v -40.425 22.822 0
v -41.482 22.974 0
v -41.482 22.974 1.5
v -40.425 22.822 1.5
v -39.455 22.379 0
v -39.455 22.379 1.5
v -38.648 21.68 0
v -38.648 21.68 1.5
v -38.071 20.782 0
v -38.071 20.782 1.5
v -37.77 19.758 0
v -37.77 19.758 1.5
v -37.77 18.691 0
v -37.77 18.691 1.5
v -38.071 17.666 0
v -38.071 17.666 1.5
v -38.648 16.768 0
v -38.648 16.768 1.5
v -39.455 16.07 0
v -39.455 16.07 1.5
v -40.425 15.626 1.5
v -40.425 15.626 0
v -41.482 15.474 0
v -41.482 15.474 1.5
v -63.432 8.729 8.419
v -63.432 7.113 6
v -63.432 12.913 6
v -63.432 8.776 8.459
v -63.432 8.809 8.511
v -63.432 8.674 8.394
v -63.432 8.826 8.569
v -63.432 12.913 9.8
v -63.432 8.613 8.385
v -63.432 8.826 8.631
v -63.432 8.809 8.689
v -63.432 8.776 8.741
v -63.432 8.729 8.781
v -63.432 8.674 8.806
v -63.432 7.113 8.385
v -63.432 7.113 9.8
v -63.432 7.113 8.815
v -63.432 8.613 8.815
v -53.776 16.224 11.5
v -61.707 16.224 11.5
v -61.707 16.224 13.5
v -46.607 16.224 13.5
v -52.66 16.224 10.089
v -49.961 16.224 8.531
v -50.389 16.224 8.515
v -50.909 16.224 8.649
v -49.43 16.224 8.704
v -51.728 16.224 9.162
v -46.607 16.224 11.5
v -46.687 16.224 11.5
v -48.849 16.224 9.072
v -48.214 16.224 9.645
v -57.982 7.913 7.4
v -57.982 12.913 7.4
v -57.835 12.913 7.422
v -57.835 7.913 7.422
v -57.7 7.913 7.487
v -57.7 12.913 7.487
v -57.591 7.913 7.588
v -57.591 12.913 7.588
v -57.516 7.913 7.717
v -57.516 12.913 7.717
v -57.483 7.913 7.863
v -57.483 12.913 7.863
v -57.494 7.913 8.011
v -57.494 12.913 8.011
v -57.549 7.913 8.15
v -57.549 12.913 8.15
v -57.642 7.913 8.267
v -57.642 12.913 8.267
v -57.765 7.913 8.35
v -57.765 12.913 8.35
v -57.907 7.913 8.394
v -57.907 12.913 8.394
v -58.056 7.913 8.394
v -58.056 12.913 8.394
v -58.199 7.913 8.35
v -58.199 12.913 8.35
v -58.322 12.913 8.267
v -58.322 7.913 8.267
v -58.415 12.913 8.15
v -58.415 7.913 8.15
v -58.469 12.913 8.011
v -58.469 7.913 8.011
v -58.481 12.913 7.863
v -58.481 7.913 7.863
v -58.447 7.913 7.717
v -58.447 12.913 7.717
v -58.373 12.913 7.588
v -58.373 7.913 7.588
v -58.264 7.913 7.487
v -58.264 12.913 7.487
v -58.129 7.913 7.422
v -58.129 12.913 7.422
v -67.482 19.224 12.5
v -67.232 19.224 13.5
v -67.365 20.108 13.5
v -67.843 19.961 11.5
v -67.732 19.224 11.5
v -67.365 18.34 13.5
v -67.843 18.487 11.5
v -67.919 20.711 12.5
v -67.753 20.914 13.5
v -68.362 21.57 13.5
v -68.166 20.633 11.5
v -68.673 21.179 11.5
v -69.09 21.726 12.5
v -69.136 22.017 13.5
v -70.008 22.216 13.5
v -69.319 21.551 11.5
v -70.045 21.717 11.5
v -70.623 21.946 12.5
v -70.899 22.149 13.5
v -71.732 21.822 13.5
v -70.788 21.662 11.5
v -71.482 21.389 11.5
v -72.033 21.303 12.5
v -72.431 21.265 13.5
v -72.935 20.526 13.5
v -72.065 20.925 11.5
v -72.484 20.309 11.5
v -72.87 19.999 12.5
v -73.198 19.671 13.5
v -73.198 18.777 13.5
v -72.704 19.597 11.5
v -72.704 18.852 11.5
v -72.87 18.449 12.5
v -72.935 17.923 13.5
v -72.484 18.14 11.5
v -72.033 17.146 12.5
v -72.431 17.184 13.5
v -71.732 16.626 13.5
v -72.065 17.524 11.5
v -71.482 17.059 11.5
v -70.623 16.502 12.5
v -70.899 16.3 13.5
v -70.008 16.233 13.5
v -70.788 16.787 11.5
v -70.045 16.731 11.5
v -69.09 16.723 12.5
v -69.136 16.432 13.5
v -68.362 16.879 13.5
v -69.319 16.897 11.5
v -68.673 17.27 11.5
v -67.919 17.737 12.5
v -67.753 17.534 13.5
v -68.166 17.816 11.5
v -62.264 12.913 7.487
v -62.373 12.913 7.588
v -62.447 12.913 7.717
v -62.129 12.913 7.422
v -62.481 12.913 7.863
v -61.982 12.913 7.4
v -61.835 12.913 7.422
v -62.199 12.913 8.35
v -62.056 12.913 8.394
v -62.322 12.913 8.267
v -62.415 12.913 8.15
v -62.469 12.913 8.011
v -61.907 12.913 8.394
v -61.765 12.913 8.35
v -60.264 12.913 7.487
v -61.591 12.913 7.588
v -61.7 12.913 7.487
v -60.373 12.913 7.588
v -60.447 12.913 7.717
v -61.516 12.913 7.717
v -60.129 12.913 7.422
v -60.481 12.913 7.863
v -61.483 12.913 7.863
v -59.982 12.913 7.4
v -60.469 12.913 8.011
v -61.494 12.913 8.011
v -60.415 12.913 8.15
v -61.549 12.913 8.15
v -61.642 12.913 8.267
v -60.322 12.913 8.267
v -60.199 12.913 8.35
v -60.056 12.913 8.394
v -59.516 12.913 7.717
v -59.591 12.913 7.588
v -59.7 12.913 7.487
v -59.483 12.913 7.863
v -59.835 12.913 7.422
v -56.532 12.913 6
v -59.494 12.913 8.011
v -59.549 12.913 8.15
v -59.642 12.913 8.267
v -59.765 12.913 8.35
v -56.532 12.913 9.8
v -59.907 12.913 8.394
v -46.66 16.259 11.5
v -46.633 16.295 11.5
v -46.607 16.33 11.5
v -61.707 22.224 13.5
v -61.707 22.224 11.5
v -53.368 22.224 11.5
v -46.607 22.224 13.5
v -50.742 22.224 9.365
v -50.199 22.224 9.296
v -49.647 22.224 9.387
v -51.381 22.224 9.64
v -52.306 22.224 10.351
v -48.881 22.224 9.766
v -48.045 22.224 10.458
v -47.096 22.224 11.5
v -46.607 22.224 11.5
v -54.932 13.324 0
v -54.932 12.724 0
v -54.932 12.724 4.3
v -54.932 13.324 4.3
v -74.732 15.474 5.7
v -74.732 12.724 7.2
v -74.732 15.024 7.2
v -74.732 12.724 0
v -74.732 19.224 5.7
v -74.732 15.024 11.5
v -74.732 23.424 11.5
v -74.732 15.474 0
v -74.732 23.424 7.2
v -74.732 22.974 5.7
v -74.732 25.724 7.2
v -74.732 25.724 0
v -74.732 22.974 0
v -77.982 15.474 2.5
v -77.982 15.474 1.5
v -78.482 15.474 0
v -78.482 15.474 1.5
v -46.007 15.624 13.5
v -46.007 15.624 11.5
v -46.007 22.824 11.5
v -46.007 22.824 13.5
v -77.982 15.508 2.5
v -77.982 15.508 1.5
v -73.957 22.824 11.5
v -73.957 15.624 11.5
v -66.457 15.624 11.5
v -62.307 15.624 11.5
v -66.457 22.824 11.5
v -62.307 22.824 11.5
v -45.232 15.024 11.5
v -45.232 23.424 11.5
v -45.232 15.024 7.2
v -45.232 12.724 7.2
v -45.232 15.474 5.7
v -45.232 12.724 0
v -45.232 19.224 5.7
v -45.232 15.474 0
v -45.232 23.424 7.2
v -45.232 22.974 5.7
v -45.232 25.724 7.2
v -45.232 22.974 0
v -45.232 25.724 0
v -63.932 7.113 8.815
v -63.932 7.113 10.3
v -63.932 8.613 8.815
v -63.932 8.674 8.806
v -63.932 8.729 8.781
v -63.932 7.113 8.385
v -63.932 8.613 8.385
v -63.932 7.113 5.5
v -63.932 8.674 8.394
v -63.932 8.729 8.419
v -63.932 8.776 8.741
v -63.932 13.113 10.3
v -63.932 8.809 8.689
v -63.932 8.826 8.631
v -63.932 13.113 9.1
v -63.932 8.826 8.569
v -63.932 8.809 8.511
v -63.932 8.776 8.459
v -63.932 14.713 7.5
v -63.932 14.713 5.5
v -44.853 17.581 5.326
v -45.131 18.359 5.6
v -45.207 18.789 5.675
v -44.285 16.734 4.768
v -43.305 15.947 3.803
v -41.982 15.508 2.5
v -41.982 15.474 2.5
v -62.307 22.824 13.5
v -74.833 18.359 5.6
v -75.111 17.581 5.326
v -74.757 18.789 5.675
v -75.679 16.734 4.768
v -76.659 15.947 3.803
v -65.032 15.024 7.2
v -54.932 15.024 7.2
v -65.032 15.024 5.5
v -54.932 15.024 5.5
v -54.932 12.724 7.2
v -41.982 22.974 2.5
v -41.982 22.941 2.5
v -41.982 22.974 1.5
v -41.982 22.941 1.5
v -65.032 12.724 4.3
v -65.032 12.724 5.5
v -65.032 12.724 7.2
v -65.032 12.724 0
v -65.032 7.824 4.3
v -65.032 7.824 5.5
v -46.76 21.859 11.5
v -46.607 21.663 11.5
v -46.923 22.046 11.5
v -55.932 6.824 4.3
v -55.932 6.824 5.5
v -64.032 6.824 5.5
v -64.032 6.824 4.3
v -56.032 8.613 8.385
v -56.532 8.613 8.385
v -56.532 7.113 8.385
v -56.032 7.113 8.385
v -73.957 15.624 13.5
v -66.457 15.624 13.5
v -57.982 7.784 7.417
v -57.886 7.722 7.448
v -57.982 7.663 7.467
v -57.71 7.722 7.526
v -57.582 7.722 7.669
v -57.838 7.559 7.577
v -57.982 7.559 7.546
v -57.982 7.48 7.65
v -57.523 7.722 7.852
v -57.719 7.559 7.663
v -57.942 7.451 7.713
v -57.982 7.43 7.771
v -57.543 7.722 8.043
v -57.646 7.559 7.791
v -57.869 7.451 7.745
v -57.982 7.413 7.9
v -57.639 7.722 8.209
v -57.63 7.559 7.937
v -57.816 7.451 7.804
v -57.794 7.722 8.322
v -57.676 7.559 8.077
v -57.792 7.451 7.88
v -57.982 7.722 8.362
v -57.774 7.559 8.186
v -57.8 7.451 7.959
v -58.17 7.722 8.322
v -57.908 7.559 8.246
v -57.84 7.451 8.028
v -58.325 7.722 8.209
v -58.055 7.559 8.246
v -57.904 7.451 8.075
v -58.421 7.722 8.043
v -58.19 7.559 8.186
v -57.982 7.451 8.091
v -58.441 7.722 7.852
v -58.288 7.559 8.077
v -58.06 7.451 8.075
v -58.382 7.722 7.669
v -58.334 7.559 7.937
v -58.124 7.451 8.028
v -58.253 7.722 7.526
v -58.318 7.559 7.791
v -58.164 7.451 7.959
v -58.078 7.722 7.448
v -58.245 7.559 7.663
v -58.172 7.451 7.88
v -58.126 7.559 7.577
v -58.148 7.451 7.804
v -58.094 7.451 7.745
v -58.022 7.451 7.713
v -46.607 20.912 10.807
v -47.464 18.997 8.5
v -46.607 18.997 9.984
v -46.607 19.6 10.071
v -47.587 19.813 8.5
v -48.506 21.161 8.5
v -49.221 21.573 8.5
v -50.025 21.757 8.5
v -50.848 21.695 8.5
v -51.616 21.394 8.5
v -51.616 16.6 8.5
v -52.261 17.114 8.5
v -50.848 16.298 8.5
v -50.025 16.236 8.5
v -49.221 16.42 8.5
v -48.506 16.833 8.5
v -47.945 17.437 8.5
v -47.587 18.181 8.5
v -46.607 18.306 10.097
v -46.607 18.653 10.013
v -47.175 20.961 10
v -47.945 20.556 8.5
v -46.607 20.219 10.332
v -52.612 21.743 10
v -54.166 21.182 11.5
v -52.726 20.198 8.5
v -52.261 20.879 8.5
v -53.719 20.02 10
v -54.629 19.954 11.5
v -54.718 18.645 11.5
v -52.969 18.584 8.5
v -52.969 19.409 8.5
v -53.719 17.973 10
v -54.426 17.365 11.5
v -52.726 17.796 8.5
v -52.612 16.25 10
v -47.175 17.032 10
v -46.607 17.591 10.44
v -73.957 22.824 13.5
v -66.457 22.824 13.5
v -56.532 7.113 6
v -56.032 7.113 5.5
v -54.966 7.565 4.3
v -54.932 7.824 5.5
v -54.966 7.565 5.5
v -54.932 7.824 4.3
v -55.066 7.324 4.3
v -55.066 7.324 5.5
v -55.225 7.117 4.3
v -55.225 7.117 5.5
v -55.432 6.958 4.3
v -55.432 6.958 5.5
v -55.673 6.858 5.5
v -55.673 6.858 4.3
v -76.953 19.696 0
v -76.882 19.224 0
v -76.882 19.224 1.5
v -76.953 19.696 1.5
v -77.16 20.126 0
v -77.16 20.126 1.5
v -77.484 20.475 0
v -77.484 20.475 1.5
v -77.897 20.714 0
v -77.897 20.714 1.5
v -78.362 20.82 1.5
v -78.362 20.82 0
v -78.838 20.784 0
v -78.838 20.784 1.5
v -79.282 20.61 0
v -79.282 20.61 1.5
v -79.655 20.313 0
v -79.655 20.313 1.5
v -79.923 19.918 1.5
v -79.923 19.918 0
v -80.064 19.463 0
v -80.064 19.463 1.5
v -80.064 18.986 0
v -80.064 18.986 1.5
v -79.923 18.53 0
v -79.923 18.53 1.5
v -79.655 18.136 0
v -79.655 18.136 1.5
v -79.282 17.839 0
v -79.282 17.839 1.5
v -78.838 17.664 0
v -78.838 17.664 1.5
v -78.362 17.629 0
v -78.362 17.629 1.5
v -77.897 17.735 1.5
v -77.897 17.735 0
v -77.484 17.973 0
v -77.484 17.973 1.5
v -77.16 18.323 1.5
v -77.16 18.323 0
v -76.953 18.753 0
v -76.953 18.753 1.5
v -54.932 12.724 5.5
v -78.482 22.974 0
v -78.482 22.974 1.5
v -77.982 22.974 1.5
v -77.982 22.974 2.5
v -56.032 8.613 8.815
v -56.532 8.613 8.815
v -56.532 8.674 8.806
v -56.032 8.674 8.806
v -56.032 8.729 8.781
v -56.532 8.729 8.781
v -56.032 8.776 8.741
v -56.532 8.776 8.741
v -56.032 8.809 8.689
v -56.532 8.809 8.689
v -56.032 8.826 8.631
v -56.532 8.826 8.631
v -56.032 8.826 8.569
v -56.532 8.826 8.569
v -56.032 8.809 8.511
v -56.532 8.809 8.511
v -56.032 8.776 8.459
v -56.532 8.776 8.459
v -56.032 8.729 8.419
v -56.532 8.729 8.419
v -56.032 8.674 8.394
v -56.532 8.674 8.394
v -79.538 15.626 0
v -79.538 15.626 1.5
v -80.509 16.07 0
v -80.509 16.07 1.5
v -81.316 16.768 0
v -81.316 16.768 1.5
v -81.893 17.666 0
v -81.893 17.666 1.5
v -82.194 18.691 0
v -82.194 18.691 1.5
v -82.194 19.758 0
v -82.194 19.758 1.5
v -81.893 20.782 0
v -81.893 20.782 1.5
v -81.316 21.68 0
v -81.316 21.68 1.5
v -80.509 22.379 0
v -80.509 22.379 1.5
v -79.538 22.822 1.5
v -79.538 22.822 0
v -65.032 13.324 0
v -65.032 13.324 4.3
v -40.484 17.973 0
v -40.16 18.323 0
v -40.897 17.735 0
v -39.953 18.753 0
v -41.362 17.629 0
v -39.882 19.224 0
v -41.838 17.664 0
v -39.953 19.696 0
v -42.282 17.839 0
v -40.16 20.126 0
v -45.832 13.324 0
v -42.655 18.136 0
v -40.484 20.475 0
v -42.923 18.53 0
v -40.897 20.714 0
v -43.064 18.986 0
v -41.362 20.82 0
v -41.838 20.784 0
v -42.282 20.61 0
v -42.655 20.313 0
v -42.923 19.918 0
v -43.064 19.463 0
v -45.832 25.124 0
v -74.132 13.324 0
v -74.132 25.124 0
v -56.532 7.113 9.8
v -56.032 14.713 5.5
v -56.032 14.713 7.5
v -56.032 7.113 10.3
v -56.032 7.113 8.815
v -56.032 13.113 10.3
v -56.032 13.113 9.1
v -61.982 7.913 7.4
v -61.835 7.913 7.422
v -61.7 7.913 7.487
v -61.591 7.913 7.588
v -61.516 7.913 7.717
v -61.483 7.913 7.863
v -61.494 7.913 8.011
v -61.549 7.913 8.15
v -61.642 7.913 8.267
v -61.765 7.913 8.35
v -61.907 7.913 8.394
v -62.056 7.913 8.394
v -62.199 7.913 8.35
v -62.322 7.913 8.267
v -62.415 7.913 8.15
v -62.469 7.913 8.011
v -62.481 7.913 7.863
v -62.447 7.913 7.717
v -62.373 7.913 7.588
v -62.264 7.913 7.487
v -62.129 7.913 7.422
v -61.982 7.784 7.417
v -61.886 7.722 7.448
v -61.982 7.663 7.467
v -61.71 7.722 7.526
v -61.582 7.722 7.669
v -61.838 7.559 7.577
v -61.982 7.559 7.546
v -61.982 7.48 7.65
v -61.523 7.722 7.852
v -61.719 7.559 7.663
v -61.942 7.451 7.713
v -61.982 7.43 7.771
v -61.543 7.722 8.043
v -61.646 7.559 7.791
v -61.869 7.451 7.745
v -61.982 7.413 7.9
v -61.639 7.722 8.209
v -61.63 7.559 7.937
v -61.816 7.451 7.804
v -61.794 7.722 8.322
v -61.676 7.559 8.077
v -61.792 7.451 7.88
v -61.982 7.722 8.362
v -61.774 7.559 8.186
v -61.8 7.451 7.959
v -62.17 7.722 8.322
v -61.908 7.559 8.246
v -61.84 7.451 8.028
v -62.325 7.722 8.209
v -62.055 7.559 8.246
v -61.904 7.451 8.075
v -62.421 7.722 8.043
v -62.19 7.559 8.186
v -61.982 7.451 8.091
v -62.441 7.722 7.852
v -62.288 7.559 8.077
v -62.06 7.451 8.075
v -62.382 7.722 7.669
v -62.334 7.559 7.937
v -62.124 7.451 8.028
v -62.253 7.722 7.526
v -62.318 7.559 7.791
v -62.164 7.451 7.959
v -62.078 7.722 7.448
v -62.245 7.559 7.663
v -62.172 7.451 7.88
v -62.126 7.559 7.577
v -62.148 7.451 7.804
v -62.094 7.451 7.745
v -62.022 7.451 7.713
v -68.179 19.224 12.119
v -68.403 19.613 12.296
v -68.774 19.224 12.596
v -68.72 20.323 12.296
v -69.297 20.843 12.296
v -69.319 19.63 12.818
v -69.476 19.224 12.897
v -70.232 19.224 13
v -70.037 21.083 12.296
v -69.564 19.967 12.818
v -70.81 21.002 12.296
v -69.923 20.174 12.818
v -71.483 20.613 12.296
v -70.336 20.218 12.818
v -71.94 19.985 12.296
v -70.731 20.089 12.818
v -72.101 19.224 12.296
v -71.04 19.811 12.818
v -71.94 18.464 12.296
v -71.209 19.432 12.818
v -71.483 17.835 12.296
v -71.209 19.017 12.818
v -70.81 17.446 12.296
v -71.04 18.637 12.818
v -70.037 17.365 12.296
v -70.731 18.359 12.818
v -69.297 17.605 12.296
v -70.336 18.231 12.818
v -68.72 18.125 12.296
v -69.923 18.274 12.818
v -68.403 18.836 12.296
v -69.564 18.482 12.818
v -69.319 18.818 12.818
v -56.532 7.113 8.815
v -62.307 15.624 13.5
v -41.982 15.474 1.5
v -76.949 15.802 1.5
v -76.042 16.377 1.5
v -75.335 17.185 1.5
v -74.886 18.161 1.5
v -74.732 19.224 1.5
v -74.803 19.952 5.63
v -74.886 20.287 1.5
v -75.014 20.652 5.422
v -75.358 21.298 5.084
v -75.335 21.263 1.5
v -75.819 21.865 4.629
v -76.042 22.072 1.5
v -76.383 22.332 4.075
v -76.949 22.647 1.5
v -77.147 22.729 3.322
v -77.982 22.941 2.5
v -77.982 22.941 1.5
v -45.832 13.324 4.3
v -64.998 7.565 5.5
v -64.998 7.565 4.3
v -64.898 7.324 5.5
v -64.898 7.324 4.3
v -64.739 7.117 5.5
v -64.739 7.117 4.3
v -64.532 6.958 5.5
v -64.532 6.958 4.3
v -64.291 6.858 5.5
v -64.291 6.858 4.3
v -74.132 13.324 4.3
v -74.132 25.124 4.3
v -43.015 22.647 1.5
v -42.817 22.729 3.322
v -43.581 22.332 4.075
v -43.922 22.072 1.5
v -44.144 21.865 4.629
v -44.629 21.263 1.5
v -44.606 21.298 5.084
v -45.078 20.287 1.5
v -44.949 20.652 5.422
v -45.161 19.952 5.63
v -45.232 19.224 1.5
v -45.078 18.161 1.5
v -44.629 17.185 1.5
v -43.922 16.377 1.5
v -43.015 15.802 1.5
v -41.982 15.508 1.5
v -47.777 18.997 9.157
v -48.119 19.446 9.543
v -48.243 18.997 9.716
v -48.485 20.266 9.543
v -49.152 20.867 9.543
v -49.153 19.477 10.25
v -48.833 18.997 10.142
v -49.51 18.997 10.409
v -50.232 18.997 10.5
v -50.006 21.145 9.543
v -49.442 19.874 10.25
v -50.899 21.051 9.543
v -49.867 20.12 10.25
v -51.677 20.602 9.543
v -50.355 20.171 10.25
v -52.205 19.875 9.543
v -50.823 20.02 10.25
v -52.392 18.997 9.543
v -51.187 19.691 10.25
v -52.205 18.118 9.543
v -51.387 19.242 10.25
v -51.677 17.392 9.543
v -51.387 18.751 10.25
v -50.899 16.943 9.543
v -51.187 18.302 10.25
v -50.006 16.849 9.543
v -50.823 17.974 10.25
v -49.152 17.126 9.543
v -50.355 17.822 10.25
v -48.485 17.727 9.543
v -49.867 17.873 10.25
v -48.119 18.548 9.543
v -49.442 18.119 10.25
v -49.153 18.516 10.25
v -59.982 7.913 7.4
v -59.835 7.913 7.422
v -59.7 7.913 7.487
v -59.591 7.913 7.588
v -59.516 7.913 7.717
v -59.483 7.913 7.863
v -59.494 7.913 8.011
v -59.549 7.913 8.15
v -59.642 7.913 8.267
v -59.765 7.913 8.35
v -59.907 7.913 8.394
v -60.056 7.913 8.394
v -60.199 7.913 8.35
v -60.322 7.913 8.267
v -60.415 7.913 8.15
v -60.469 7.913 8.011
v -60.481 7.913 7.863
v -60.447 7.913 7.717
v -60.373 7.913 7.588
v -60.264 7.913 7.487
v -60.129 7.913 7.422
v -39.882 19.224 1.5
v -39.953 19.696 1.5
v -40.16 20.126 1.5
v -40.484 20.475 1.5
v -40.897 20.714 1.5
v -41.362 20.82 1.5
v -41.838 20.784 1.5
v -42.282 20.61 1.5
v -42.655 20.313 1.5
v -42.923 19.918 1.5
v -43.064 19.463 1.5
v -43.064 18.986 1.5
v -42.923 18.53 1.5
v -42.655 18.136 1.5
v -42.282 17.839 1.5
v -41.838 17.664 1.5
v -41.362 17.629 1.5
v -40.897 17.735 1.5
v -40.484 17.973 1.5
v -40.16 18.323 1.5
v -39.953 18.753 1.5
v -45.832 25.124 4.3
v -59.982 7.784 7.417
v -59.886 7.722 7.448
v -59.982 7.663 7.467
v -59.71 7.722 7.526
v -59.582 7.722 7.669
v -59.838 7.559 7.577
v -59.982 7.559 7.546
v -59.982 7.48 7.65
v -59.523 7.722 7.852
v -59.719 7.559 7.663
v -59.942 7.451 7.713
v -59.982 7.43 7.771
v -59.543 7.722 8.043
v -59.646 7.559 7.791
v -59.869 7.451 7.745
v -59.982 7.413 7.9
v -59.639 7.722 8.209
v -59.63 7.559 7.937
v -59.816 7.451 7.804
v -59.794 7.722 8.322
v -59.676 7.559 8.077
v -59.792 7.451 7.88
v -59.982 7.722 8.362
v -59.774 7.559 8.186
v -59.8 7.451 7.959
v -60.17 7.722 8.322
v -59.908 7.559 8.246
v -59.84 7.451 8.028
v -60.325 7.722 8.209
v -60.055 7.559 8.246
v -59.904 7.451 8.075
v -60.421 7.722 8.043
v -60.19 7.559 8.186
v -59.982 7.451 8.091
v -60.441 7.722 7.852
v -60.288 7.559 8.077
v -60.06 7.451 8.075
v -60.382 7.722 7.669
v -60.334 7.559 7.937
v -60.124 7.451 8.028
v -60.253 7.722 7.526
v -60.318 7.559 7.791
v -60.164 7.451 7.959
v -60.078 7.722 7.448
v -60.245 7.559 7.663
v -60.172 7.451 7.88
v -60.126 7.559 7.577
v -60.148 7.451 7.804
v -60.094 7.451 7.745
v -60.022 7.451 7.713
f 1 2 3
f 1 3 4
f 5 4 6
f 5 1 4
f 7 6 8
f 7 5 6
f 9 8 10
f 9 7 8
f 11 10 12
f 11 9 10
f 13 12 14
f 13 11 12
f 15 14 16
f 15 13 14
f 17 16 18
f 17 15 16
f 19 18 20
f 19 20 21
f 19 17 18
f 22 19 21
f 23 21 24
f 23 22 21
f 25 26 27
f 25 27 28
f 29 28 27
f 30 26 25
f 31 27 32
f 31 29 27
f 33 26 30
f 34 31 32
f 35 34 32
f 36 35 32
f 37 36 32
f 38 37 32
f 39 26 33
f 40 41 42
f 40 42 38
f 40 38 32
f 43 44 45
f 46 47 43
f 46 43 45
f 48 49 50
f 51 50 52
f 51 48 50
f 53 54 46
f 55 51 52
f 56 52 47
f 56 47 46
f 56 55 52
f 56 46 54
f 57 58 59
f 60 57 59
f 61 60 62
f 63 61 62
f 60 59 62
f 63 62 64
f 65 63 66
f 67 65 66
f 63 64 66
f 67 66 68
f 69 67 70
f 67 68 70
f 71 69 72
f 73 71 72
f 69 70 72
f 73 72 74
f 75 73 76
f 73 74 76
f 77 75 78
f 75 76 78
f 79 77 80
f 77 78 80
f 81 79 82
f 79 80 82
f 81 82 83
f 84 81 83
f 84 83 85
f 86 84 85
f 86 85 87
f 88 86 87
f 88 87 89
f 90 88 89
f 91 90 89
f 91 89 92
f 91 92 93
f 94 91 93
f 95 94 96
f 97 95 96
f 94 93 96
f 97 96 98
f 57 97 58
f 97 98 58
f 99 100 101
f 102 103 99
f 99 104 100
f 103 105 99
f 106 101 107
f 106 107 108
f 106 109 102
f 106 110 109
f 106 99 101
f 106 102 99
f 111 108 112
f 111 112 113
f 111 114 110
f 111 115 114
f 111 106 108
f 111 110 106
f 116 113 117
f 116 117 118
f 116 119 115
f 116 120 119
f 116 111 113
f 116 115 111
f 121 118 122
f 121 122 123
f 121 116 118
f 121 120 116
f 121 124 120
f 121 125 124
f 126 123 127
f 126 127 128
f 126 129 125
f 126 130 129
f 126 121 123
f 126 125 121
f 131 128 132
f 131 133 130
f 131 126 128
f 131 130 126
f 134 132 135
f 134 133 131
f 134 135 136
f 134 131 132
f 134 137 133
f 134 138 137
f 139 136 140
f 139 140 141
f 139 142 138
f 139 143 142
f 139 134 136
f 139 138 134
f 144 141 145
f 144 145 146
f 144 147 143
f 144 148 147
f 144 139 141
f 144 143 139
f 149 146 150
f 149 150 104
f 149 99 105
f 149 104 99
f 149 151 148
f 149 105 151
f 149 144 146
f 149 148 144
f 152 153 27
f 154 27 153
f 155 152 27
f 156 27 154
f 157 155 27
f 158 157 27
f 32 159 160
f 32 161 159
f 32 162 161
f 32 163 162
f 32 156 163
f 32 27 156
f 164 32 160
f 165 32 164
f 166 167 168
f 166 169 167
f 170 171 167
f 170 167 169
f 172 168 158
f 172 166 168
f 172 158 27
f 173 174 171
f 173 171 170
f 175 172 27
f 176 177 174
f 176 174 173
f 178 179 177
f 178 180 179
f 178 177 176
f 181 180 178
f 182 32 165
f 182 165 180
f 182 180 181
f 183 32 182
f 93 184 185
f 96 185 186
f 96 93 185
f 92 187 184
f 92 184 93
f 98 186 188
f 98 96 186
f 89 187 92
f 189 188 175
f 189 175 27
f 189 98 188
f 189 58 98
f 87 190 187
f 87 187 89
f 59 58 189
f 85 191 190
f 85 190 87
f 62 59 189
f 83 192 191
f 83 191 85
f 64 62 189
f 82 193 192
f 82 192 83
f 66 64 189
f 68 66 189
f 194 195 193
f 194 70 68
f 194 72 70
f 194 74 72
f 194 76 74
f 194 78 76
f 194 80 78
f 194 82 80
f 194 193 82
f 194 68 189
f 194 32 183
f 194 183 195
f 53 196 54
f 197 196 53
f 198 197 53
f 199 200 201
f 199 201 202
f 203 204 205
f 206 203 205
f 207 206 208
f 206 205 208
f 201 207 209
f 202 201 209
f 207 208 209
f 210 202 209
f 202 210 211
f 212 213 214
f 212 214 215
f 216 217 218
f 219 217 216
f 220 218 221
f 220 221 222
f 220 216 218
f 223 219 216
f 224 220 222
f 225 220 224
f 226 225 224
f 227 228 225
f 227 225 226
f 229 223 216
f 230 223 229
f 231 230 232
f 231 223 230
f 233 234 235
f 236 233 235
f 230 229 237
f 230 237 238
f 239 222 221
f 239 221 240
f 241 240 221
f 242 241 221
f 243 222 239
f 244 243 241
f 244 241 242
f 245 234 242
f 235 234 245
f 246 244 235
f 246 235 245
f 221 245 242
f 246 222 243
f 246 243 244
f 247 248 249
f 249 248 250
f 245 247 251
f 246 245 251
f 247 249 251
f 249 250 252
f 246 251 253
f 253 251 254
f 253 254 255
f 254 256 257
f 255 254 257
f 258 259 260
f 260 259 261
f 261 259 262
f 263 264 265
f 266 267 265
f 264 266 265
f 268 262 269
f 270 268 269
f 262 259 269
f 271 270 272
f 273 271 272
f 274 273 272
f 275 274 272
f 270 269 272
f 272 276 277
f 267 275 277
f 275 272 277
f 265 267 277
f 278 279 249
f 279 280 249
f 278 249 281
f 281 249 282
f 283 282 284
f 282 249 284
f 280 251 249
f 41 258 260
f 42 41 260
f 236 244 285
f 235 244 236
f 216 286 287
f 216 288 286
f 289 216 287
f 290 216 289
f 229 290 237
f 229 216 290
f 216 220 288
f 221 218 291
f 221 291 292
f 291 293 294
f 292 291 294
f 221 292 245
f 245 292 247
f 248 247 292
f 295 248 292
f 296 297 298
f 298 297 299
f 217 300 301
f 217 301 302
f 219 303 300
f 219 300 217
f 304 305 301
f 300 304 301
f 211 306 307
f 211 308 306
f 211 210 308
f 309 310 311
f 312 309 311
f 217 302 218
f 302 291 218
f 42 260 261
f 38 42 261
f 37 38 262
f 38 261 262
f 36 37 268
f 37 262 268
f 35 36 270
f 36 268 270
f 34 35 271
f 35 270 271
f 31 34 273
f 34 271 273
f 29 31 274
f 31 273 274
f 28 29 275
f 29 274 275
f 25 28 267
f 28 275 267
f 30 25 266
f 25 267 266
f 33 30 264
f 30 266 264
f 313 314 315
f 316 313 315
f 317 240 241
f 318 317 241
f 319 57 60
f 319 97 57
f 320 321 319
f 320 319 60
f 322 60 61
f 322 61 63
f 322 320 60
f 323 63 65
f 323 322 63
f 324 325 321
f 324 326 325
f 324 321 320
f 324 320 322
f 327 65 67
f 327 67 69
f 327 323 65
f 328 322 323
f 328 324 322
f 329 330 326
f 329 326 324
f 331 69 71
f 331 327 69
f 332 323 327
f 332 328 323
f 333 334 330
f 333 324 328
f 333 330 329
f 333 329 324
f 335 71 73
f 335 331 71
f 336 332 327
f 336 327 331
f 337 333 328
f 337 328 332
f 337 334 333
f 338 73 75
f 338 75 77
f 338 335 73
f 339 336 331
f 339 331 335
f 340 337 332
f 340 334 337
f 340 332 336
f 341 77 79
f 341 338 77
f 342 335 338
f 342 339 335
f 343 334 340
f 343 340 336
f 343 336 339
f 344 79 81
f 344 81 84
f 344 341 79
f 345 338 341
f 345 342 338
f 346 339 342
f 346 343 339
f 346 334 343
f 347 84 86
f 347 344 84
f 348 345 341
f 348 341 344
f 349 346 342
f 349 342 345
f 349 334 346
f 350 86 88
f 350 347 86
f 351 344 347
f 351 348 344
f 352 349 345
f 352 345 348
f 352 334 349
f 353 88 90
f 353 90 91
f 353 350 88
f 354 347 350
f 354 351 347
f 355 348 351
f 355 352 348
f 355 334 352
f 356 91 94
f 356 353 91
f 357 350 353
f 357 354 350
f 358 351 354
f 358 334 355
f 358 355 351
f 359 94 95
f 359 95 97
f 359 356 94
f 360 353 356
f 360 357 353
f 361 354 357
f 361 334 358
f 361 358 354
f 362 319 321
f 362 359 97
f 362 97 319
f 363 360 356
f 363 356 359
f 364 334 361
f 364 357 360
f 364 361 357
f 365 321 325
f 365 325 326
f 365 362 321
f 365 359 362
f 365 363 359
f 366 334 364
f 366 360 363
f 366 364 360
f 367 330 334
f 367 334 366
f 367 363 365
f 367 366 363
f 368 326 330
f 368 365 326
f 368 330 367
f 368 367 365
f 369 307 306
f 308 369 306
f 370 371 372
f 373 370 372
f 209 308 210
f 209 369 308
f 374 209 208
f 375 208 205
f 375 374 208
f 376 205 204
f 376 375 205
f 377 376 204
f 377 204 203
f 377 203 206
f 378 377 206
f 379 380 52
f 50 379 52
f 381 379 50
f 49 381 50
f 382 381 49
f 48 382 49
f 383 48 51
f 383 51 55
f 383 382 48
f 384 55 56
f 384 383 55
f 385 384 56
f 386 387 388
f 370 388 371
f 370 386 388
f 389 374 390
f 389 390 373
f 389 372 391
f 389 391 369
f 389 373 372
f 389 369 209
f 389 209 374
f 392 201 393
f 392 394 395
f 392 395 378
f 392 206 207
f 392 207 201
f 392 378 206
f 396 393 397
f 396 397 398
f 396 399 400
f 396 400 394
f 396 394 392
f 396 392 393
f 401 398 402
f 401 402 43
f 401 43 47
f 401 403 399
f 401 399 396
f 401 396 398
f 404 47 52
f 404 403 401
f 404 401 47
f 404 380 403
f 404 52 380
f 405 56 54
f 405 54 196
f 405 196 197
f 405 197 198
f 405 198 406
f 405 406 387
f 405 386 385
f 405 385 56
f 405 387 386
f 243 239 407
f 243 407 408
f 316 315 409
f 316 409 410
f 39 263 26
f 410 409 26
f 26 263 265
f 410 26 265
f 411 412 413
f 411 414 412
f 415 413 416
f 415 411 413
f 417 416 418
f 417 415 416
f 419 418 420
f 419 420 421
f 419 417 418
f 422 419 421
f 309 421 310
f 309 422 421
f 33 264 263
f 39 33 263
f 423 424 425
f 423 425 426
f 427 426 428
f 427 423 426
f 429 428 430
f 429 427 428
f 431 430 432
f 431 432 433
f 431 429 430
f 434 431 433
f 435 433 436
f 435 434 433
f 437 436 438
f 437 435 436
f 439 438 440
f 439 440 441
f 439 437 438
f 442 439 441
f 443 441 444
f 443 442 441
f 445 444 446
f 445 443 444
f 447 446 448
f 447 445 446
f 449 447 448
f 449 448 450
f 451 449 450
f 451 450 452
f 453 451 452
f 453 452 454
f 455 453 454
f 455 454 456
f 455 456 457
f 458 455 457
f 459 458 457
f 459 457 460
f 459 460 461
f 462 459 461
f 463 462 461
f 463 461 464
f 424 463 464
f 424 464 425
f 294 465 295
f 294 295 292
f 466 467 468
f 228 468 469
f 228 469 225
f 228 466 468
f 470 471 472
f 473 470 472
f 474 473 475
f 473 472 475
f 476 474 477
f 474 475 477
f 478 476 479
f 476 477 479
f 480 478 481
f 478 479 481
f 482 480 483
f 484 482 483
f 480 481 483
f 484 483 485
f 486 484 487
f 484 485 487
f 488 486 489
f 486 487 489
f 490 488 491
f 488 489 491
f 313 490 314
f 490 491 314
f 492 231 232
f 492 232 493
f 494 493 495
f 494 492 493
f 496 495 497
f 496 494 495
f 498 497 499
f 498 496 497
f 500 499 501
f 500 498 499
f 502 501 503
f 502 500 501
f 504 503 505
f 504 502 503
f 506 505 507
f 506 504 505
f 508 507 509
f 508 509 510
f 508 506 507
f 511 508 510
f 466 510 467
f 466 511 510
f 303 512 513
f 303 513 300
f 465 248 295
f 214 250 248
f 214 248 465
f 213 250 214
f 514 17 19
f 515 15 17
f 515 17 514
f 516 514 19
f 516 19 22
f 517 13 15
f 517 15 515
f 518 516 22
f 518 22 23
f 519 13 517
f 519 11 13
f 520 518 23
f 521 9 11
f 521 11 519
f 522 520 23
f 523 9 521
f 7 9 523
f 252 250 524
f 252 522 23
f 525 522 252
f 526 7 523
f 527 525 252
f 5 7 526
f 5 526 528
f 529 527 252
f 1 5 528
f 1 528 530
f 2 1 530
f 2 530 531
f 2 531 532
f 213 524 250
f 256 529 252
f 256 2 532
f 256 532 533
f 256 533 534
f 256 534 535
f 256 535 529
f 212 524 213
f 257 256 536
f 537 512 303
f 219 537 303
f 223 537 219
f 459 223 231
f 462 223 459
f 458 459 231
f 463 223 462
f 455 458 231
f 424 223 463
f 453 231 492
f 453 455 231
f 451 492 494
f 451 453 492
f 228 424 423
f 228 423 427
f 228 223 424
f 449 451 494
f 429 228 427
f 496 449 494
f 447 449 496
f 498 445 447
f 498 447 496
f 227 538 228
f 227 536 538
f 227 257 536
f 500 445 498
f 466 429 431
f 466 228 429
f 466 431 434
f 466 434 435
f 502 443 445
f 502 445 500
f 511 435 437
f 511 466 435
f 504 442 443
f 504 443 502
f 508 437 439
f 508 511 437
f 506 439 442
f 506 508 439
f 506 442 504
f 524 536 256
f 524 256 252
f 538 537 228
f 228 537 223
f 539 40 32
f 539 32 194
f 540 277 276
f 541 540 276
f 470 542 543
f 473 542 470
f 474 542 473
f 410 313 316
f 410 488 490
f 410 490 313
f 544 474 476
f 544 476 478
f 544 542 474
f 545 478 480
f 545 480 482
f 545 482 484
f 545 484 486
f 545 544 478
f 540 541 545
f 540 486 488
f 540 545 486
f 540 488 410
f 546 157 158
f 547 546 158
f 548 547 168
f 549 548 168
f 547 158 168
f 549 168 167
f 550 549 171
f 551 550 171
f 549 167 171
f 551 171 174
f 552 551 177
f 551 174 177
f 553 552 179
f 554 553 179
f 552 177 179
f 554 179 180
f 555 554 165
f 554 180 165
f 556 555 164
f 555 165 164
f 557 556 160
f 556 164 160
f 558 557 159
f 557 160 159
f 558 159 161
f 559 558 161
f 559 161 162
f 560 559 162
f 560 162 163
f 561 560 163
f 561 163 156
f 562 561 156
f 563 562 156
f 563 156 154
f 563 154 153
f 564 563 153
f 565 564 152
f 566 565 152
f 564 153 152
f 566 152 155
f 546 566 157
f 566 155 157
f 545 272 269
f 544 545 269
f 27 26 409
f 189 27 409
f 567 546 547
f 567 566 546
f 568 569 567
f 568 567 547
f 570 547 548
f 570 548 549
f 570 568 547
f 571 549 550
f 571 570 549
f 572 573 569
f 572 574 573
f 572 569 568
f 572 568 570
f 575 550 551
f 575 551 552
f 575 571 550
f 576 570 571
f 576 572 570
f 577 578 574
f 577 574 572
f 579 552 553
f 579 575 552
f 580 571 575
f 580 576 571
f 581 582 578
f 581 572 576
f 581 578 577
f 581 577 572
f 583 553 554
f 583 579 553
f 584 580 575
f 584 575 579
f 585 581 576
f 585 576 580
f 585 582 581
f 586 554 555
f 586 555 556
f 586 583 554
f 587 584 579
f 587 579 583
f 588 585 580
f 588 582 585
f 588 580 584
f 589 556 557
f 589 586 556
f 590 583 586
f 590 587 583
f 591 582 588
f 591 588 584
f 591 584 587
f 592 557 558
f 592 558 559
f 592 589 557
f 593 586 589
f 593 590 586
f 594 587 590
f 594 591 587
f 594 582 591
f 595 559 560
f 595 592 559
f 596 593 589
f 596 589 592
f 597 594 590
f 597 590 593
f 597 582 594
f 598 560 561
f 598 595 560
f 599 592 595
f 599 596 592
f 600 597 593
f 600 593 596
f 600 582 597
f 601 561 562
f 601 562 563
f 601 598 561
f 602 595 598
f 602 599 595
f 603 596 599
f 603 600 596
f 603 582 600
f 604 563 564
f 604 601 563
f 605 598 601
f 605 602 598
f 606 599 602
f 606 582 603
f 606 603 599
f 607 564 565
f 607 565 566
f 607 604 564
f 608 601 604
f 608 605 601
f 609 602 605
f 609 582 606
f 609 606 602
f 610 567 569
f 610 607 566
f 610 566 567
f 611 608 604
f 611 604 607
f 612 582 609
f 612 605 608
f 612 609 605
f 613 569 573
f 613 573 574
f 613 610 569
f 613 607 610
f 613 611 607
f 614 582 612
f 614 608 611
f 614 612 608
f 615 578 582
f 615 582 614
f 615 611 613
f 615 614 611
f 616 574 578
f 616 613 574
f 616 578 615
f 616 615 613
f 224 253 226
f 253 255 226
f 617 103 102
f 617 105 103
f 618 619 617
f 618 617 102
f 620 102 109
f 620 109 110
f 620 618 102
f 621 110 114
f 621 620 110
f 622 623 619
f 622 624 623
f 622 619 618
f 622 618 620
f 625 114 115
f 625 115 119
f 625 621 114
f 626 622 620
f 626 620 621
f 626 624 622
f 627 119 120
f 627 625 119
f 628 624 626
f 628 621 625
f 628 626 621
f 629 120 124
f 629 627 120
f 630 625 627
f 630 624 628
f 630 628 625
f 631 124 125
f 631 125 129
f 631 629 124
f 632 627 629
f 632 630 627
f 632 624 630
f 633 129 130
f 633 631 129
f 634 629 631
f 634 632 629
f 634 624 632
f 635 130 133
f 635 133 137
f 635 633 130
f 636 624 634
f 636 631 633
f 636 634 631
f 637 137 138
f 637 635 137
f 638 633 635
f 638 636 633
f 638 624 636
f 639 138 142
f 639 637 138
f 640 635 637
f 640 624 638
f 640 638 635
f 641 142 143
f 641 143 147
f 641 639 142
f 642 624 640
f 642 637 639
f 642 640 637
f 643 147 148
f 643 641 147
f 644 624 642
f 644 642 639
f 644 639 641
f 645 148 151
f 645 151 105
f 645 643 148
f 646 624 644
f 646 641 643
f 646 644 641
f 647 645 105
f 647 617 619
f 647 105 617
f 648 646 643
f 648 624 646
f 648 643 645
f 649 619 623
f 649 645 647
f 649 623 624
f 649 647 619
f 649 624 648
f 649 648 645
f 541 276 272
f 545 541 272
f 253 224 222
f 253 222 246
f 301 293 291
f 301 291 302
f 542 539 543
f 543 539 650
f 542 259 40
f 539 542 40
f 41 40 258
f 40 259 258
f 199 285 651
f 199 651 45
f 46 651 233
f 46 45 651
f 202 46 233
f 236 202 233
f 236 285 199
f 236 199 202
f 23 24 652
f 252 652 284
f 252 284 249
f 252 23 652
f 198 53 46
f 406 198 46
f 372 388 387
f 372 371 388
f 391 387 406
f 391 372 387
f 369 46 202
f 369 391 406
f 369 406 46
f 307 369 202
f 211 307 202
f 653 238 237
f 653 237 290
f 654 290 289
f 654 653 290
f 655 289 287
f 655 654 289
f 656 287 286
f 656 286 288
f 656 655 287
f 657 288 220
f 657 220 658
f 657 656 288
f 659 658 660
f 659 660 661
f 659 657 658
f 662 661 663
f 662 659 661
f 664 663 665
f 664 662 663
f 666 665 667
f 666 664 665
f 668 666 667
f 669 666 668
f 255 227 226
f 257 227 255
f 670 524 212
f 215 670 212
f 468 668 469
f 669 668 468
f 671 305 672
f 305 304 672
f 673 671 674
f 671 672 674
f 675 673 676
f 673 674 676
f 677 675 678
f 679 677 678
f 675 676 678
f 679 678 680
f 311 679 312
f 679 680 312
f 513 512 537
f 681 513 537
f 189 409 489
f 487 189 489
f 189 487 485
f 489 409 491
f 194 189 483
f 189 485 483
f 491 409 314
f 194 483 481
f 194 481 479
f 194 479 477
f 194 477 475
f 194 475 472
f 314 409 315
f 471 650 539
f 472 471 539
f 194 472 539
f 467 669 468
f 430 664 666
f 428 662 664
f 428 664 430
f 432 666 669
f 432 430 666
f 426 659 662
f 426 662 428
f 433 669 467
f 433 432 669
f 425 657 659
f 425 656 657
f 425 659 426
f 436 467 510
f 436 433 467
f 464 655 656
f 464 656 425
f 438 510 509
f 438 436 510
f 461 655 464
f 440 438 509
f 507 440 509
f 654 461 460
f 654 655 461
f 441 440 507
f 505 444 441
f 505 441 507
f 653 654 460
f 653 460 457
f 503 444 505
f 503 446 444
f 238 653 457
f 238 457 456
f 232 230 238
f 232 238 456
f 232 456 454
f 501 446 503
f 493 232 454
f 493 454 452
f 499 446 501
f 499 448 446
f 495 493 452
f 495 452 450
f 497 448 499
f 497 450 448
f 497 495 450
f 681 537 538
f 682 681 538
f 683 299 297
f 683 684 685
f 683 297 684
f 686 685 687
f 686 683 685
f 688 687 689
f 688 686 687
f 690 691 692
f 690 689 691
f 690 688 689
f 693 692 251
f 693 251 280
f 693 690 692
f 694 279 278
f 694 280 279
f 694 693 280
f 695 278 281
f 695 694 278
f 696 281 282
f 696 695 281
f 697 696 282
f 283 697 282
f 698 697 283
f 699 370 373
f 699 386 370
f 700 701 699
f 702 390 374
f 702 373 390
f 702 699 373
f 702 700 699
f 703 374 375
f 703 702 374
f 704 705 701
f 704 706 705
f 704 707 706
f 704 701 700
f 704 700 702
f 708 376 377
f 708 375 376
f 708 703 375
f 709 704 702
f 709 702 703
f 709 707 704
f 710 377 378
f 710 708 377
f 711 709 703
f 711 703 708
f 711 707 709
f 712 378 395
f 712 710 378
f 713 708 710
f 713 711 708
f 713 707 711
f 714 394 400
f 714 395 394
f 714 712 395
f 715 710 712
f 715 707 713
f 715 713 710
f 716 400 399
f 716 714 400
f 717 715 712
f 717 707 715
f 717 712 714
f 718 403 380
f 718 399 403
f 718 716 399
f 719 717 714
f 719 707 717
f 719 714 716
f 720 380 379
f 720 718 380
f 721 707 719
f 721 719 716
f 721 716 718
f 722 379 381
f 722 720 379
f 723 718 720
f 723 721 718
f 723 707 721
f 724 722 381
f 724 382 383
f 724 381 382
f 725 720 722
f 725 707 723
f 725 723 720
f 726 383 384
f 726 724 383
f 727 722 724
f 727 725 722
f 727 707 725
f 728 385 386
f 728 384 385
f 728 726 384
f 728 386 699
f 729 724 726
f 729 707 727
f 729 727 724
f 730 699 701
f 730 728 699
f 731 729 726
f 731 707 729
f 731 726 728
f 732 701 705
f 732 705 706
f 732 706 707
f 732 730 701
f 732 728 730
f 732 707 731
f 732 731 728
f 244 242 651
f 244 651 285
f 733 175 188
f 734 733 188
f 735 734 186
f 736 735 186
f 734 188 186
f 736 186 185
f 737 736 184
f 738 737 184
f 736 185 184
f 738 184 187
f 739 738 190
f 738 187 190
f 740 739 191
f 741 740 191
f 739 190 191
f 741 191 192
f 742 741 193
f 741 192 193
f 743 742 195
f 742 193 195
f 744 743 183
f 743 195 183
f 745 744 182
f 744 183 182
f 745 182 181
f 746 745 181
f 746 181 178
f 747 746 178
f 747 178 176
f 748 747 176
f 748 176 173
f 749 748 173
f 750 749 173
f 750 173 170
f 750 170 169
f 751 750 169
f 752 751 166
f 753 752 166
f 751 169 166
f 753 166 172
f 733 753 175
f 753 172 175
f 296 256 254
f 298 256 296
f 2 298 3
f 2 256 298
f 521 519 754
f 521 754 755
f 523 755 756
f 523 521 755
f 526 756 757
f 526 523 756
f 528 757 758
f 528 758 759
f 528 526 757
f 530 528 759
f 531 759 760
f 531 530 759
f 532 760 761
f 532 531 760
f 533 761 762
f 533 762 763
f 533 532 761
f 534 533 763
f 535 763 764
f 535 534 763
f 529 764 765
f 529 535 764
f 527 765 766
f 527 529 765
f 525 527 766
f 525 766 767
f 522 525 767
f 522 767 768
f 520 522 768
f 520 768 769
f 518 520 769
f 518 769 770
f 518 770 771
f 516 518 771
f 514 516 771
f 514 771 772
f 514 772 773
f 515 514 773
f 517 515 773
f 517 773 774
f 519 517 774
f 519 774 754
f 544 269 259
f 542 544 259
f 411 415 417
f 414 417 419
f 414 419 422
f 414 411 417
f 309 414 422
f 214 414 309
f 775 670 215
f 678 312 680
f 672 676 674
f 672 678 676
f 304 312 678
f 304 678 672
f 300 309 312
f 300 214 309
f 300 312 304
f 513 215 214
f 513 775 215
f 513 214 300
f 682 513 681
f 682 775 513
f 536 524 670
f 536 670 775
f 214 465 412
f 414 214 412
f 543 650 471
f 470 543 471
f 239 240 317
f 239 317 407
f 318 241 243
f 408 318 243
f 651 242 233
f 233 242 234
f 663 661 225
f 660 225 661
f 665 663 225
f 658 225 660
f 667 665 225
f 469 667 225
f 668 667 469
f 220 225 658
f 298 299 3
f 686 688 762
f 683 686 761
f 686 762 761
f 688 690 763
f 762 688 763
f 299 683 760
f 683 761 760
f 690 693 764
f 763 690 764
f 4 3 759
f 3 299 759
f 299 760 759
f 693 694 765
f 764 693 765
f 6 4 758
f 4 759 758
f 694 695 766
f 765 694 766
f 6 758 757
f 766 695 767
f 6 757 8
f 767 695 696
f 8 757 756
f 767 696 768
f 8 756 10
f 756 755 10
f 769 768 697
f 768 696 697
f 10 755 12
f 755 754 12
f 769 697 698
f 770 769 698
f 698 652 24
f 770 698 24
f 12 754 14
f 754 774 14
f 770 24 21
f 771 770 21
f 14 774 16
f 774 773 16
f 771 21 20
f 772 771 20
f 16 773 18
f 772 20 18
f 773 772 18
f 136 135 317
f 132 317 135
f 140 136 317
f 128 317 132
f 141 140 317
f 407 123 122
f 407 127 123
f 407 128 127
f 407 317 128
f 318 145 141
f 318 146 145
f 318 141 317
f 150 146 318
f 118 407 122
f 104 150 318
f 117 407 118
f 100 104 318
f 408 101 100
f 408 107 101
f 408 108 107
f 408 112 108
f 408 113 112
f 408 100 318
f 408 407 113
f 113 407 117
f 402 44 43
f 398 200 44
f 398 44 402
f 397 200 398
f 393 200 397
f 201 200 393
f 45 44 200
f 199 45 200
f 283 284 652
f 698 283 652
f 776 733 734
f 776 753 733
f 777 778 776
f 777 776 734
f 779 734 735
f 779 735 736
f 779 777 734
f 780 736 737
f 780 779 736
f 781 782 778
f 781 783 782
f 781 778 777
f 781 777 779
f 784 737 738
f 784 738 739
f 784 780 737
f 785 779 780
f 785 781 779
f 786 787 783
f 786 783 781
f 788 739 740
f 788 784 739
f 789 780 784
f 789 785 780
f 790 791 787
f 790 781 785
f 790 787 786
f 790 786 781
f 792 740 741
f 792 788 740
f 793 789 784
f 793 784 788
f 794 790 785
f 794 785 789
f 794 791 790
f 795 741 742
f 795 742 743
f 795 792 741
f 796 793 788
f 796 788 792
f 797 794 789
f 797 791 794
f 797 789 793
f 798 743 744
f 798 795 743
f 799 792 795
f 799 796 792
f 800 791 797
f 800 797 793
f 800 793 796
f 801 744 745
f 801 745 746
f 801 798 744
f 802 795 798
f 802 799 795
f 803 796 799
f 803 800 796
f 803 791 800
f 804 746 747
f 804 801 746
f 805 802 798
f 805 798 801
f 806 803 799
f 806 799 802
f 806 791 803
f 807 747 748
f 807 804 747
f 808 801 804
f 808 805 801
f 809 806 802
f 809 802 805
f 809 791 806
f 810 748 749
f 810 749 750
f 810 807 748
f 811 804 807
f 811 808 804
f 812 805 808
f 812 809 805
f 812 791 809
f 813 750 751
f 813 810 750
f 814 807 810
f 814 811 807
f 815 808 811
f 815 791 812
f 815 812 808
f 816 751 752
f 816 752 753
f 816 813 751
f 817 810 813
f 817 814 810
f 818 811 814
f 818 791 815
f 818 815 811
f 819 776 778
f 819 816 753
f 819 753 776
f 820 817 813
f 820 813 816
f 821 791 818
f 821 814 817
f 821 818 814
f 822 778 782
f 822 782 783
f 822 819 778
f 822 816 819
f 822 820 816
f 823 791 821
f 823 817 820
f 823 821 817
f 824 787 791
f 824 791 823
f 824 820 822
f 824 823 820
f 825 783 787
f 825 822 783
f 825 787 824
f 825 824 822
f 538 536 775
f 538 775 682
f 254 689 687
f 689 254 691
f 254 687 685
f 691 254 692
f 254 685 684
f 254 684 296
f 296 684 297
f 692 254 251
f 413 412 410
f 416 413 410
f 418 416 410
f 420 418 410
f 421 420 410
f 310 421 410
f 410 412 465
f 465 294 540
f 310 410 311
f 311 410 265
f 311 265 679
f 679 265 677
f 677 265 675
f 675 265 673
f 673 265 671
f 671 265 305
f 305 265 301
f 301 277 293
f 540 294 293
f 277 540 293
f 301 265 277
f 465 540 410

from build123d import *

# Parameters (mm, degrees)
SKETCH2_R                = 1.6
BOSS_EXTRUDE1_DEPTH      = 7.2
CUT_EXTRUDE1_DEPTH       = 84.563926387
SKETCH5_R                = 3.75
CUT_EXTRUDE2_DEPTH       = 87.349960246
SKETCH6_W                = 29.5
SKETCH6_H                = 8.4
BOSS_EXTRUDE2_DEPTH      = 4.3
SKETCH7_W                = 7.5
SKETCH7_H                = 7.2
SKETCH7_R                = 2.5
SKETCH7_W_2              = 16.3
SKETCH7_W_3              = 15.1
SKETCH7_H_2              = 6
BOSS_EXTRUDE3_DEPTH      = 2
CHAMFER1_SIZE2           = 2
CHAMFER1_SIZE            = 0.5
SKETCH8_R                = 2.5
CUT_EXTRUDE3_DEPTH       = 3
CHAMFER2_SIZE            = 2
CHAMFER2_SIZE_2          = 3.464101615
SKETCH9_W                = 28.3
SKETCH9_H                = 11.8
CUT_EXTRUDE4_DEPTH       = 5.5
BOSS_EXTRUDE4_DEPTH      = 1.2
FILLET1_R                = 1
BOSS_EXTRUDE5_DEPTH      = 3.95
BOSS_EXTRUDE5_DEPTH_BACK = 3.95
SKETCH17_W               = 6.9
SKETCH17_H               = 3.8
CUT_EXTRUDE5_DEPTH       = 5.8
SKETCH18_R               = 0.5
BOSS_EXTRUDE6_DEPTH      = 5.5
FILLET2_R                = 0.5


# Some blends are built 0.0001 mm under size
with BuildPart() as part:
    # Sketch2 → Boss-Extrude1 (new body)
    with BuildSketch(Plane.XY):
        with BuildLine():
            Line((-74.731926848, 25.724226739), (-45.231926848, 25.724226739))
            Line((-45.231926848, 25.724226739), (-45.231926848, 22.974226739))
            Line((-45.231926848, 22.974226739), (-41.481926848, 22.974226739))
            ThreePointArc((-41.481926848, 22.974226739), (-37.731926848, 19.224226739), (-41.481926848, 15.474226739))
            Line((-41.481926848, 15.474226739), (-45.231926848, 15.474226739))
            Line((-45.231926848, 15.474226739), (-45.231926848, 12.724226739))
            Line((-45.231926848, 12.724226739), (-54.931926848, 12.724226739))
            Line((-54.931926848, 12.724226739), (-54.931926848, 15.024226739))
            Line((-54.931926848, 15.024226739), (-65.031926848, 15.024226739))
            Line((-65.031926848, 15.024226739), (-65.031926848, 12.724226739))
            Line((-65.031926848, 12.724226739), (-74.731926848, 12.724226739))
            Line((-74.731926848, 12.724226739), (-74.731926848, 15.474226739))
            Line((-74.731926848, 15.474226739), (-78.481926848, 15.474226739))
            ThreePointArc((-78.481926848, 15.474226739), (-82.231926848, 19.224226739), (-78.481926848, 22.974226739))
            Line((-78.481926848, 22.974226739), (-74.731926848, 22.974226739))
            Line((-74.731926848, 22.974226739), (-74.731926848, 25.724226739))
        make_face()
        with Locations((-78.481926848, 19.224226739)):
            Circle(SKETCH2_R, mode=Mode.SUBTRACT)
        with Locations((-41.481926848, 19.224226739)):
            Circle(SKETCH2_R, mode=Mode.SUBTRACT)
    extrude(amount=BOSS_EXTRUDE1_DEPTH)

    # Sketch4 → Cut-Extrude1 (cut, through all)
    with BuildSketch(Plane.XZ.offset(-12.724226739)):
        Polygon((-74.731926848, 5.7), (-77.981926848, 2.5), (-77.981926848, 1.5), (-84.83036896, 1.5), (-84.83036896, 9.527639916), (-74.731926848, 9.527639916), align=None)
        Polygon((-45.231926848, 9.527639916), (-45.231926848, 5.7), (-41.981926848, 2.5), (-41.981926848, 1.5), (-35.133484736, 1.5), (-35.133484736, 9.527639916), align=None)
    extrude(amount=-CUT_EXTRUDE1_DEPTH, mode=Mode.SUBTRACT)

    # Sketch5 → Cut-Extrude2 (cut, through all)
    with BuildSketch(Plane.XY.offset(1.5)):
        with Locations((-78.481926848, 19.224226739)):
            Circle(SKETCH5_R)
        with Locations((-41.481926848, 19.224226739)):
            Circle(SKETCH5_R)
    extrude(amount=CUT_EXTRUDE2_DEPTH, mode=Mode.SUBTRACT)

    # Sketch6 → Boss-Extrude2 (add)
    with BuildSketch(Plane.XY.offset(7.2)):
        with Locations((-59.981926848, 19.224226739)):
            Rectangle(SKETCH6_W, SKETCH6_H)
    extrude(amount=BOSS_EXTRUDE2_DEPTH)

    # Sketch7 → Boss-Extrude3 (add)
    # profile 1 of 2: a face of its own
    with BuildSketch(Plane.XY.offset(11.5)):
        with Locations((-70.206926848, 19.224226739)):
            Rectangle(SKETCH7_W, SKETCH7_H)
        with Locations((-70.231926848, 19.224226739)):
            Circle(SKETCH7_R, mode=Mode.SUBTRACT)
    # profile 2 of 2: a face of its own
    with BuildSketch(Plane.XY.offset(11.5)):
        with Locations((-54.156926848, 19.224226739)):
            Rectangle(SKETCH7_W_2, SKETCH7_H)
        with Locations((-54.156926848, 19.224226739)):
            Rectangle(SKETCH7_W_3, SKETCH7_H_2, mode=Mode.SUBTRACT)
    extrude(amount=BOSS_EXTRUDE3_DEPTH)

    # Chamfer1
    chamfer1_edges = [part.edges().sort_by_distance(p)[0] for p in [
        (-72.731926848, 19.224226739, 13.5),
    ]]
    chamfer1_side = [part.faces().sort_by_distance(p)[0] for p in [
        (-72.741926848, 19.224226739, 13.5),
    ]]
    chamfer(chamfer1_edges, length=CHAMFER1_SIZE - 0.0001, length2=CHAMFER1_SIZE2 - 0.0001, reference=chamfer1_side[0])  # a hair under: the kernel refuses the full size

    # Sketch8 → Cut-Extrude3 (cut)
    with BuildSketch(Plane.XY.offset(11.5)):
        with Locations((-50.231926848, 18.99663901)):
            Circle(SKETCH8_R)
    extrude(amount=-CUT_EXTRUDE3_DEPTH, mode=Mode.SUBTRACT)

    # Chamfer2
    # the kernel refuses this chamfer: 3.464101615, 2 mm, written as the material it takes off along each edge
    with BuildSketch(Plane(origin=(-50.231926848, 18.99663901, 11.5), x_dir=(1, 0, 0), z_dir=(0, -1, 0))) as chamfer2_piece_1_section:
        Polygon((2.5 + CHAMFER2_SIZE, 0), (2.5, -CHAMFER2_SIZE_2), (2.5, 0), align=None)
    chamfer2_piece_1 = revolve(axis=Axis((-50.231926848, 18.99663901, 11.5), (0, 0, 1)), mode=Mode.PRIVATE)
    chamfer2_piece_1 = split(chamfer2_piece_1, bisect_by=Plane(origin=(-53.833665029, 16.224226739, 10.018611703), z_dir=(0, 1, 0)), keep=Keep.TOP, mode=Mode.PRIVATE)
    chamfer2_piece_1 = split(chamfer2_piece_1, bisect_by=Plane(origin=(-46.606926848, 18.99663901, 10.018611703), z_dir=(-1, 0, 0)), keep=Keep.TOP, mode=Mode.PRIVATE)
    chamfer2_piece_1 = split(chamfer2_piece_1, bisect_by=Plane(origin=(-53.833665029, 22.224226739, 10.018611703), z_dir=(0, -1, 0)), keep=Keep.TOP, mode=Mode.PRIVATE)
    chamfer2_piece_1 = split(chamfer2_piece_1, bisect_by=Plane(origin=(-53.833665029, 18.99663901, 8.5), z_dir=(0, 0, 1)), keep=Keep.TOP, mode=Mode.PRIVATE)
    add(chamfer2_piece_1, mode=Mode.SUBTRACT)

    # Sketch9 → Cut-Extrude4 (cut)
    with BuildSketch(Plane(origin=(0, 0, 0), x_dir=(-1, 0, 0), z_dir=(0, 0, -1))):
        with Locations((59.981926848, 19.224226739)):
            Rectangle(SKETCH9_W, SKETCH9_H)
    extrude(amount=-CUT_EXTRUDE4_DEPTH, mode=Mode.SUBTRACT)

    # Sketch10 → Boss-Extrude4 (add)
    with BuildSketch(Plane(origin=(0, 0, 5.5), x_dir=(-1, 0, 0), z_dir=(0, 0, -1))):
        Polygon((54.931926848, 13.324226739), (54.931926848, 6.824226739), (65.031926848, 6.824226739), (65.031926848, 13.324226739), (74.131926848, 13.324226739), (74.131926848, 25.124226739), (45.831926848, 25.124226739), (45.831926848, 13.324226739), align=None)
    extrude(amount=BOSS_EXTRUDE4_DEPTH)

    # Sketch11 → Revolve1 (revolve)
    with BuildSketch(Plane(origin=(0, 18.99663901, 0), x_dir=(1, 0, 0), z_dir=(0, 1, 0))):
        with BuildLine():
            Line((-50.231926848, -8.5), (-47.463977656, -8.5))
            ThreePointArc((-47.463977656, -8.5), (-48.524476795, -9.947681814), (-50.231926848, -10.5))
            Line((-50.231926848, -10.5), (-50.231926848, -8.5))
        make_face()
    revolve(axis=Axis((-50.231926848, 18.99663901, 8.5), (0, 0, 1)))

    # Sketch14 → Revolve2 (revolve)
    with BuildSketch(Plane(origin=(0, 19.224226739, 0), x_dir=(-1, 0, 0), z_dir=(0, -1, 0)), mode=Mode.PRIVATE) as revolve2_sk:
        with BuildLine():
            Line((70.231926848, -11.5), (72.731926848, -11.5))
            ThreePointArc((72.731926848, -11.5), (71.689664822, -12.596229956), (70.231926848, -13))
            Line((70.231926848, -13), (70.231926848, -11.5))
        make_face()
    revolve(revolve2_sk.sketch.rotate(Axis((-70.231926848, 19.224226739, 11.5), (0, 0, 1)), 180), axis=Axis((-70.231926848, 19.224226739, 11.5), (0, 0, 1)))

    # Fillet1
    fillet1_edges = [part.edges().sort_by_distance(p)[0] for p in [
        (-65.031926848, 6.824226739, 4.9),
        (-54.931926848, 6.824226739, 4.9),
    ]]
    fillet(fillet1_edges, radius=FILLET1_R)

    # Sketch16 → Boss-Extrude5 (add, two sides: drawn at the far end of the back side and taken through both)
    with BuildSketch(Plane(origin=(-59.981926848, 0, 0), x_dir=(0, 0, -1), z_dir=(1, 0, 0)).offset(-BOSS_EXTRUDE5_DEPTH_BACK)):
        with BuildLine():
            Line((-8.384982209, 8.613050121), (-8.384982209, 7.113050121))
            Line((-8.384982209, 7.113050121), (-5.5, 7.113050121))
            Line((-5.5, 7.113050121), (-5.5, 14.713050121))
            Line((-5.5, 14.713050121), (-7.5, 14.713050121))
            Line((-7.5, 14.713050121), (-9.1, 13.113050121))
            Line((-9.1, 13.113050121), (-10.3, 13.113050121))
            Line((-10.3, 13.113050121), (-10.3, 7.113050121))
            Line((-10.3, 7.113050121), (-8.815017791, 7.113050121))
            Line((-8.815017791, 7.113050121), (-8.815017791, 8.613050121))
            ThreePointArc((-8.815017791, 8.613050121), (-8.6, 8.828067912), (-8.384982209, 8.613050121))
        make_face()
    extrude(amount=BOSS_EXTRUDE5_DEPTH + BOSS_EXTRUDE5_DEPTH_BACK)

    # Sketch17 → Cut-Extrude5 (cut)
    with BuildSketch(Plane.XZ.offset(-7.113050121)):
        with Locations((-59.981926848, 7.9)):
            Rectangle(SKETCH17_W, SKETCH17_H)
    extrude(amount=-CUT_EXTRUDE5_DEPTH, mode=Mode.SUBTRACT)

    # Sketch18 → Boss-Extrude6 (add)
    with BuildSketch(Plane.XZ.offset(-12.913050121)):
        with Locations(Location((-59.981926848, 7.9, 0), (0, 0, 270))):
            Circle(SKETCH18_R)
        with Locations(Location((-57.981926848, 7.9, 0), (0, 0, 270))):
            Circle(SKETCH18_R)
        with Locations(Location((-61.981926848, 7.9, 0), (0, 0, 270))):
            Circle(SKETCH18_R)
    extrude(amount=BOSS_EXTRUDE6_DEPTH)

    # Fillet2
    fillet2_edges = [part.edges().sort_by_distance(p)[0] for p in [
        (-59.981926848, 7.413050121, 8.4),
        (-57.981926848, 7.413050121, 8.4),
        (-61.981926848, 7.413050121, 8.4),
    ]]
    fillet(fillet2_edges, radius=FILLET2_R)


solid = part.part
